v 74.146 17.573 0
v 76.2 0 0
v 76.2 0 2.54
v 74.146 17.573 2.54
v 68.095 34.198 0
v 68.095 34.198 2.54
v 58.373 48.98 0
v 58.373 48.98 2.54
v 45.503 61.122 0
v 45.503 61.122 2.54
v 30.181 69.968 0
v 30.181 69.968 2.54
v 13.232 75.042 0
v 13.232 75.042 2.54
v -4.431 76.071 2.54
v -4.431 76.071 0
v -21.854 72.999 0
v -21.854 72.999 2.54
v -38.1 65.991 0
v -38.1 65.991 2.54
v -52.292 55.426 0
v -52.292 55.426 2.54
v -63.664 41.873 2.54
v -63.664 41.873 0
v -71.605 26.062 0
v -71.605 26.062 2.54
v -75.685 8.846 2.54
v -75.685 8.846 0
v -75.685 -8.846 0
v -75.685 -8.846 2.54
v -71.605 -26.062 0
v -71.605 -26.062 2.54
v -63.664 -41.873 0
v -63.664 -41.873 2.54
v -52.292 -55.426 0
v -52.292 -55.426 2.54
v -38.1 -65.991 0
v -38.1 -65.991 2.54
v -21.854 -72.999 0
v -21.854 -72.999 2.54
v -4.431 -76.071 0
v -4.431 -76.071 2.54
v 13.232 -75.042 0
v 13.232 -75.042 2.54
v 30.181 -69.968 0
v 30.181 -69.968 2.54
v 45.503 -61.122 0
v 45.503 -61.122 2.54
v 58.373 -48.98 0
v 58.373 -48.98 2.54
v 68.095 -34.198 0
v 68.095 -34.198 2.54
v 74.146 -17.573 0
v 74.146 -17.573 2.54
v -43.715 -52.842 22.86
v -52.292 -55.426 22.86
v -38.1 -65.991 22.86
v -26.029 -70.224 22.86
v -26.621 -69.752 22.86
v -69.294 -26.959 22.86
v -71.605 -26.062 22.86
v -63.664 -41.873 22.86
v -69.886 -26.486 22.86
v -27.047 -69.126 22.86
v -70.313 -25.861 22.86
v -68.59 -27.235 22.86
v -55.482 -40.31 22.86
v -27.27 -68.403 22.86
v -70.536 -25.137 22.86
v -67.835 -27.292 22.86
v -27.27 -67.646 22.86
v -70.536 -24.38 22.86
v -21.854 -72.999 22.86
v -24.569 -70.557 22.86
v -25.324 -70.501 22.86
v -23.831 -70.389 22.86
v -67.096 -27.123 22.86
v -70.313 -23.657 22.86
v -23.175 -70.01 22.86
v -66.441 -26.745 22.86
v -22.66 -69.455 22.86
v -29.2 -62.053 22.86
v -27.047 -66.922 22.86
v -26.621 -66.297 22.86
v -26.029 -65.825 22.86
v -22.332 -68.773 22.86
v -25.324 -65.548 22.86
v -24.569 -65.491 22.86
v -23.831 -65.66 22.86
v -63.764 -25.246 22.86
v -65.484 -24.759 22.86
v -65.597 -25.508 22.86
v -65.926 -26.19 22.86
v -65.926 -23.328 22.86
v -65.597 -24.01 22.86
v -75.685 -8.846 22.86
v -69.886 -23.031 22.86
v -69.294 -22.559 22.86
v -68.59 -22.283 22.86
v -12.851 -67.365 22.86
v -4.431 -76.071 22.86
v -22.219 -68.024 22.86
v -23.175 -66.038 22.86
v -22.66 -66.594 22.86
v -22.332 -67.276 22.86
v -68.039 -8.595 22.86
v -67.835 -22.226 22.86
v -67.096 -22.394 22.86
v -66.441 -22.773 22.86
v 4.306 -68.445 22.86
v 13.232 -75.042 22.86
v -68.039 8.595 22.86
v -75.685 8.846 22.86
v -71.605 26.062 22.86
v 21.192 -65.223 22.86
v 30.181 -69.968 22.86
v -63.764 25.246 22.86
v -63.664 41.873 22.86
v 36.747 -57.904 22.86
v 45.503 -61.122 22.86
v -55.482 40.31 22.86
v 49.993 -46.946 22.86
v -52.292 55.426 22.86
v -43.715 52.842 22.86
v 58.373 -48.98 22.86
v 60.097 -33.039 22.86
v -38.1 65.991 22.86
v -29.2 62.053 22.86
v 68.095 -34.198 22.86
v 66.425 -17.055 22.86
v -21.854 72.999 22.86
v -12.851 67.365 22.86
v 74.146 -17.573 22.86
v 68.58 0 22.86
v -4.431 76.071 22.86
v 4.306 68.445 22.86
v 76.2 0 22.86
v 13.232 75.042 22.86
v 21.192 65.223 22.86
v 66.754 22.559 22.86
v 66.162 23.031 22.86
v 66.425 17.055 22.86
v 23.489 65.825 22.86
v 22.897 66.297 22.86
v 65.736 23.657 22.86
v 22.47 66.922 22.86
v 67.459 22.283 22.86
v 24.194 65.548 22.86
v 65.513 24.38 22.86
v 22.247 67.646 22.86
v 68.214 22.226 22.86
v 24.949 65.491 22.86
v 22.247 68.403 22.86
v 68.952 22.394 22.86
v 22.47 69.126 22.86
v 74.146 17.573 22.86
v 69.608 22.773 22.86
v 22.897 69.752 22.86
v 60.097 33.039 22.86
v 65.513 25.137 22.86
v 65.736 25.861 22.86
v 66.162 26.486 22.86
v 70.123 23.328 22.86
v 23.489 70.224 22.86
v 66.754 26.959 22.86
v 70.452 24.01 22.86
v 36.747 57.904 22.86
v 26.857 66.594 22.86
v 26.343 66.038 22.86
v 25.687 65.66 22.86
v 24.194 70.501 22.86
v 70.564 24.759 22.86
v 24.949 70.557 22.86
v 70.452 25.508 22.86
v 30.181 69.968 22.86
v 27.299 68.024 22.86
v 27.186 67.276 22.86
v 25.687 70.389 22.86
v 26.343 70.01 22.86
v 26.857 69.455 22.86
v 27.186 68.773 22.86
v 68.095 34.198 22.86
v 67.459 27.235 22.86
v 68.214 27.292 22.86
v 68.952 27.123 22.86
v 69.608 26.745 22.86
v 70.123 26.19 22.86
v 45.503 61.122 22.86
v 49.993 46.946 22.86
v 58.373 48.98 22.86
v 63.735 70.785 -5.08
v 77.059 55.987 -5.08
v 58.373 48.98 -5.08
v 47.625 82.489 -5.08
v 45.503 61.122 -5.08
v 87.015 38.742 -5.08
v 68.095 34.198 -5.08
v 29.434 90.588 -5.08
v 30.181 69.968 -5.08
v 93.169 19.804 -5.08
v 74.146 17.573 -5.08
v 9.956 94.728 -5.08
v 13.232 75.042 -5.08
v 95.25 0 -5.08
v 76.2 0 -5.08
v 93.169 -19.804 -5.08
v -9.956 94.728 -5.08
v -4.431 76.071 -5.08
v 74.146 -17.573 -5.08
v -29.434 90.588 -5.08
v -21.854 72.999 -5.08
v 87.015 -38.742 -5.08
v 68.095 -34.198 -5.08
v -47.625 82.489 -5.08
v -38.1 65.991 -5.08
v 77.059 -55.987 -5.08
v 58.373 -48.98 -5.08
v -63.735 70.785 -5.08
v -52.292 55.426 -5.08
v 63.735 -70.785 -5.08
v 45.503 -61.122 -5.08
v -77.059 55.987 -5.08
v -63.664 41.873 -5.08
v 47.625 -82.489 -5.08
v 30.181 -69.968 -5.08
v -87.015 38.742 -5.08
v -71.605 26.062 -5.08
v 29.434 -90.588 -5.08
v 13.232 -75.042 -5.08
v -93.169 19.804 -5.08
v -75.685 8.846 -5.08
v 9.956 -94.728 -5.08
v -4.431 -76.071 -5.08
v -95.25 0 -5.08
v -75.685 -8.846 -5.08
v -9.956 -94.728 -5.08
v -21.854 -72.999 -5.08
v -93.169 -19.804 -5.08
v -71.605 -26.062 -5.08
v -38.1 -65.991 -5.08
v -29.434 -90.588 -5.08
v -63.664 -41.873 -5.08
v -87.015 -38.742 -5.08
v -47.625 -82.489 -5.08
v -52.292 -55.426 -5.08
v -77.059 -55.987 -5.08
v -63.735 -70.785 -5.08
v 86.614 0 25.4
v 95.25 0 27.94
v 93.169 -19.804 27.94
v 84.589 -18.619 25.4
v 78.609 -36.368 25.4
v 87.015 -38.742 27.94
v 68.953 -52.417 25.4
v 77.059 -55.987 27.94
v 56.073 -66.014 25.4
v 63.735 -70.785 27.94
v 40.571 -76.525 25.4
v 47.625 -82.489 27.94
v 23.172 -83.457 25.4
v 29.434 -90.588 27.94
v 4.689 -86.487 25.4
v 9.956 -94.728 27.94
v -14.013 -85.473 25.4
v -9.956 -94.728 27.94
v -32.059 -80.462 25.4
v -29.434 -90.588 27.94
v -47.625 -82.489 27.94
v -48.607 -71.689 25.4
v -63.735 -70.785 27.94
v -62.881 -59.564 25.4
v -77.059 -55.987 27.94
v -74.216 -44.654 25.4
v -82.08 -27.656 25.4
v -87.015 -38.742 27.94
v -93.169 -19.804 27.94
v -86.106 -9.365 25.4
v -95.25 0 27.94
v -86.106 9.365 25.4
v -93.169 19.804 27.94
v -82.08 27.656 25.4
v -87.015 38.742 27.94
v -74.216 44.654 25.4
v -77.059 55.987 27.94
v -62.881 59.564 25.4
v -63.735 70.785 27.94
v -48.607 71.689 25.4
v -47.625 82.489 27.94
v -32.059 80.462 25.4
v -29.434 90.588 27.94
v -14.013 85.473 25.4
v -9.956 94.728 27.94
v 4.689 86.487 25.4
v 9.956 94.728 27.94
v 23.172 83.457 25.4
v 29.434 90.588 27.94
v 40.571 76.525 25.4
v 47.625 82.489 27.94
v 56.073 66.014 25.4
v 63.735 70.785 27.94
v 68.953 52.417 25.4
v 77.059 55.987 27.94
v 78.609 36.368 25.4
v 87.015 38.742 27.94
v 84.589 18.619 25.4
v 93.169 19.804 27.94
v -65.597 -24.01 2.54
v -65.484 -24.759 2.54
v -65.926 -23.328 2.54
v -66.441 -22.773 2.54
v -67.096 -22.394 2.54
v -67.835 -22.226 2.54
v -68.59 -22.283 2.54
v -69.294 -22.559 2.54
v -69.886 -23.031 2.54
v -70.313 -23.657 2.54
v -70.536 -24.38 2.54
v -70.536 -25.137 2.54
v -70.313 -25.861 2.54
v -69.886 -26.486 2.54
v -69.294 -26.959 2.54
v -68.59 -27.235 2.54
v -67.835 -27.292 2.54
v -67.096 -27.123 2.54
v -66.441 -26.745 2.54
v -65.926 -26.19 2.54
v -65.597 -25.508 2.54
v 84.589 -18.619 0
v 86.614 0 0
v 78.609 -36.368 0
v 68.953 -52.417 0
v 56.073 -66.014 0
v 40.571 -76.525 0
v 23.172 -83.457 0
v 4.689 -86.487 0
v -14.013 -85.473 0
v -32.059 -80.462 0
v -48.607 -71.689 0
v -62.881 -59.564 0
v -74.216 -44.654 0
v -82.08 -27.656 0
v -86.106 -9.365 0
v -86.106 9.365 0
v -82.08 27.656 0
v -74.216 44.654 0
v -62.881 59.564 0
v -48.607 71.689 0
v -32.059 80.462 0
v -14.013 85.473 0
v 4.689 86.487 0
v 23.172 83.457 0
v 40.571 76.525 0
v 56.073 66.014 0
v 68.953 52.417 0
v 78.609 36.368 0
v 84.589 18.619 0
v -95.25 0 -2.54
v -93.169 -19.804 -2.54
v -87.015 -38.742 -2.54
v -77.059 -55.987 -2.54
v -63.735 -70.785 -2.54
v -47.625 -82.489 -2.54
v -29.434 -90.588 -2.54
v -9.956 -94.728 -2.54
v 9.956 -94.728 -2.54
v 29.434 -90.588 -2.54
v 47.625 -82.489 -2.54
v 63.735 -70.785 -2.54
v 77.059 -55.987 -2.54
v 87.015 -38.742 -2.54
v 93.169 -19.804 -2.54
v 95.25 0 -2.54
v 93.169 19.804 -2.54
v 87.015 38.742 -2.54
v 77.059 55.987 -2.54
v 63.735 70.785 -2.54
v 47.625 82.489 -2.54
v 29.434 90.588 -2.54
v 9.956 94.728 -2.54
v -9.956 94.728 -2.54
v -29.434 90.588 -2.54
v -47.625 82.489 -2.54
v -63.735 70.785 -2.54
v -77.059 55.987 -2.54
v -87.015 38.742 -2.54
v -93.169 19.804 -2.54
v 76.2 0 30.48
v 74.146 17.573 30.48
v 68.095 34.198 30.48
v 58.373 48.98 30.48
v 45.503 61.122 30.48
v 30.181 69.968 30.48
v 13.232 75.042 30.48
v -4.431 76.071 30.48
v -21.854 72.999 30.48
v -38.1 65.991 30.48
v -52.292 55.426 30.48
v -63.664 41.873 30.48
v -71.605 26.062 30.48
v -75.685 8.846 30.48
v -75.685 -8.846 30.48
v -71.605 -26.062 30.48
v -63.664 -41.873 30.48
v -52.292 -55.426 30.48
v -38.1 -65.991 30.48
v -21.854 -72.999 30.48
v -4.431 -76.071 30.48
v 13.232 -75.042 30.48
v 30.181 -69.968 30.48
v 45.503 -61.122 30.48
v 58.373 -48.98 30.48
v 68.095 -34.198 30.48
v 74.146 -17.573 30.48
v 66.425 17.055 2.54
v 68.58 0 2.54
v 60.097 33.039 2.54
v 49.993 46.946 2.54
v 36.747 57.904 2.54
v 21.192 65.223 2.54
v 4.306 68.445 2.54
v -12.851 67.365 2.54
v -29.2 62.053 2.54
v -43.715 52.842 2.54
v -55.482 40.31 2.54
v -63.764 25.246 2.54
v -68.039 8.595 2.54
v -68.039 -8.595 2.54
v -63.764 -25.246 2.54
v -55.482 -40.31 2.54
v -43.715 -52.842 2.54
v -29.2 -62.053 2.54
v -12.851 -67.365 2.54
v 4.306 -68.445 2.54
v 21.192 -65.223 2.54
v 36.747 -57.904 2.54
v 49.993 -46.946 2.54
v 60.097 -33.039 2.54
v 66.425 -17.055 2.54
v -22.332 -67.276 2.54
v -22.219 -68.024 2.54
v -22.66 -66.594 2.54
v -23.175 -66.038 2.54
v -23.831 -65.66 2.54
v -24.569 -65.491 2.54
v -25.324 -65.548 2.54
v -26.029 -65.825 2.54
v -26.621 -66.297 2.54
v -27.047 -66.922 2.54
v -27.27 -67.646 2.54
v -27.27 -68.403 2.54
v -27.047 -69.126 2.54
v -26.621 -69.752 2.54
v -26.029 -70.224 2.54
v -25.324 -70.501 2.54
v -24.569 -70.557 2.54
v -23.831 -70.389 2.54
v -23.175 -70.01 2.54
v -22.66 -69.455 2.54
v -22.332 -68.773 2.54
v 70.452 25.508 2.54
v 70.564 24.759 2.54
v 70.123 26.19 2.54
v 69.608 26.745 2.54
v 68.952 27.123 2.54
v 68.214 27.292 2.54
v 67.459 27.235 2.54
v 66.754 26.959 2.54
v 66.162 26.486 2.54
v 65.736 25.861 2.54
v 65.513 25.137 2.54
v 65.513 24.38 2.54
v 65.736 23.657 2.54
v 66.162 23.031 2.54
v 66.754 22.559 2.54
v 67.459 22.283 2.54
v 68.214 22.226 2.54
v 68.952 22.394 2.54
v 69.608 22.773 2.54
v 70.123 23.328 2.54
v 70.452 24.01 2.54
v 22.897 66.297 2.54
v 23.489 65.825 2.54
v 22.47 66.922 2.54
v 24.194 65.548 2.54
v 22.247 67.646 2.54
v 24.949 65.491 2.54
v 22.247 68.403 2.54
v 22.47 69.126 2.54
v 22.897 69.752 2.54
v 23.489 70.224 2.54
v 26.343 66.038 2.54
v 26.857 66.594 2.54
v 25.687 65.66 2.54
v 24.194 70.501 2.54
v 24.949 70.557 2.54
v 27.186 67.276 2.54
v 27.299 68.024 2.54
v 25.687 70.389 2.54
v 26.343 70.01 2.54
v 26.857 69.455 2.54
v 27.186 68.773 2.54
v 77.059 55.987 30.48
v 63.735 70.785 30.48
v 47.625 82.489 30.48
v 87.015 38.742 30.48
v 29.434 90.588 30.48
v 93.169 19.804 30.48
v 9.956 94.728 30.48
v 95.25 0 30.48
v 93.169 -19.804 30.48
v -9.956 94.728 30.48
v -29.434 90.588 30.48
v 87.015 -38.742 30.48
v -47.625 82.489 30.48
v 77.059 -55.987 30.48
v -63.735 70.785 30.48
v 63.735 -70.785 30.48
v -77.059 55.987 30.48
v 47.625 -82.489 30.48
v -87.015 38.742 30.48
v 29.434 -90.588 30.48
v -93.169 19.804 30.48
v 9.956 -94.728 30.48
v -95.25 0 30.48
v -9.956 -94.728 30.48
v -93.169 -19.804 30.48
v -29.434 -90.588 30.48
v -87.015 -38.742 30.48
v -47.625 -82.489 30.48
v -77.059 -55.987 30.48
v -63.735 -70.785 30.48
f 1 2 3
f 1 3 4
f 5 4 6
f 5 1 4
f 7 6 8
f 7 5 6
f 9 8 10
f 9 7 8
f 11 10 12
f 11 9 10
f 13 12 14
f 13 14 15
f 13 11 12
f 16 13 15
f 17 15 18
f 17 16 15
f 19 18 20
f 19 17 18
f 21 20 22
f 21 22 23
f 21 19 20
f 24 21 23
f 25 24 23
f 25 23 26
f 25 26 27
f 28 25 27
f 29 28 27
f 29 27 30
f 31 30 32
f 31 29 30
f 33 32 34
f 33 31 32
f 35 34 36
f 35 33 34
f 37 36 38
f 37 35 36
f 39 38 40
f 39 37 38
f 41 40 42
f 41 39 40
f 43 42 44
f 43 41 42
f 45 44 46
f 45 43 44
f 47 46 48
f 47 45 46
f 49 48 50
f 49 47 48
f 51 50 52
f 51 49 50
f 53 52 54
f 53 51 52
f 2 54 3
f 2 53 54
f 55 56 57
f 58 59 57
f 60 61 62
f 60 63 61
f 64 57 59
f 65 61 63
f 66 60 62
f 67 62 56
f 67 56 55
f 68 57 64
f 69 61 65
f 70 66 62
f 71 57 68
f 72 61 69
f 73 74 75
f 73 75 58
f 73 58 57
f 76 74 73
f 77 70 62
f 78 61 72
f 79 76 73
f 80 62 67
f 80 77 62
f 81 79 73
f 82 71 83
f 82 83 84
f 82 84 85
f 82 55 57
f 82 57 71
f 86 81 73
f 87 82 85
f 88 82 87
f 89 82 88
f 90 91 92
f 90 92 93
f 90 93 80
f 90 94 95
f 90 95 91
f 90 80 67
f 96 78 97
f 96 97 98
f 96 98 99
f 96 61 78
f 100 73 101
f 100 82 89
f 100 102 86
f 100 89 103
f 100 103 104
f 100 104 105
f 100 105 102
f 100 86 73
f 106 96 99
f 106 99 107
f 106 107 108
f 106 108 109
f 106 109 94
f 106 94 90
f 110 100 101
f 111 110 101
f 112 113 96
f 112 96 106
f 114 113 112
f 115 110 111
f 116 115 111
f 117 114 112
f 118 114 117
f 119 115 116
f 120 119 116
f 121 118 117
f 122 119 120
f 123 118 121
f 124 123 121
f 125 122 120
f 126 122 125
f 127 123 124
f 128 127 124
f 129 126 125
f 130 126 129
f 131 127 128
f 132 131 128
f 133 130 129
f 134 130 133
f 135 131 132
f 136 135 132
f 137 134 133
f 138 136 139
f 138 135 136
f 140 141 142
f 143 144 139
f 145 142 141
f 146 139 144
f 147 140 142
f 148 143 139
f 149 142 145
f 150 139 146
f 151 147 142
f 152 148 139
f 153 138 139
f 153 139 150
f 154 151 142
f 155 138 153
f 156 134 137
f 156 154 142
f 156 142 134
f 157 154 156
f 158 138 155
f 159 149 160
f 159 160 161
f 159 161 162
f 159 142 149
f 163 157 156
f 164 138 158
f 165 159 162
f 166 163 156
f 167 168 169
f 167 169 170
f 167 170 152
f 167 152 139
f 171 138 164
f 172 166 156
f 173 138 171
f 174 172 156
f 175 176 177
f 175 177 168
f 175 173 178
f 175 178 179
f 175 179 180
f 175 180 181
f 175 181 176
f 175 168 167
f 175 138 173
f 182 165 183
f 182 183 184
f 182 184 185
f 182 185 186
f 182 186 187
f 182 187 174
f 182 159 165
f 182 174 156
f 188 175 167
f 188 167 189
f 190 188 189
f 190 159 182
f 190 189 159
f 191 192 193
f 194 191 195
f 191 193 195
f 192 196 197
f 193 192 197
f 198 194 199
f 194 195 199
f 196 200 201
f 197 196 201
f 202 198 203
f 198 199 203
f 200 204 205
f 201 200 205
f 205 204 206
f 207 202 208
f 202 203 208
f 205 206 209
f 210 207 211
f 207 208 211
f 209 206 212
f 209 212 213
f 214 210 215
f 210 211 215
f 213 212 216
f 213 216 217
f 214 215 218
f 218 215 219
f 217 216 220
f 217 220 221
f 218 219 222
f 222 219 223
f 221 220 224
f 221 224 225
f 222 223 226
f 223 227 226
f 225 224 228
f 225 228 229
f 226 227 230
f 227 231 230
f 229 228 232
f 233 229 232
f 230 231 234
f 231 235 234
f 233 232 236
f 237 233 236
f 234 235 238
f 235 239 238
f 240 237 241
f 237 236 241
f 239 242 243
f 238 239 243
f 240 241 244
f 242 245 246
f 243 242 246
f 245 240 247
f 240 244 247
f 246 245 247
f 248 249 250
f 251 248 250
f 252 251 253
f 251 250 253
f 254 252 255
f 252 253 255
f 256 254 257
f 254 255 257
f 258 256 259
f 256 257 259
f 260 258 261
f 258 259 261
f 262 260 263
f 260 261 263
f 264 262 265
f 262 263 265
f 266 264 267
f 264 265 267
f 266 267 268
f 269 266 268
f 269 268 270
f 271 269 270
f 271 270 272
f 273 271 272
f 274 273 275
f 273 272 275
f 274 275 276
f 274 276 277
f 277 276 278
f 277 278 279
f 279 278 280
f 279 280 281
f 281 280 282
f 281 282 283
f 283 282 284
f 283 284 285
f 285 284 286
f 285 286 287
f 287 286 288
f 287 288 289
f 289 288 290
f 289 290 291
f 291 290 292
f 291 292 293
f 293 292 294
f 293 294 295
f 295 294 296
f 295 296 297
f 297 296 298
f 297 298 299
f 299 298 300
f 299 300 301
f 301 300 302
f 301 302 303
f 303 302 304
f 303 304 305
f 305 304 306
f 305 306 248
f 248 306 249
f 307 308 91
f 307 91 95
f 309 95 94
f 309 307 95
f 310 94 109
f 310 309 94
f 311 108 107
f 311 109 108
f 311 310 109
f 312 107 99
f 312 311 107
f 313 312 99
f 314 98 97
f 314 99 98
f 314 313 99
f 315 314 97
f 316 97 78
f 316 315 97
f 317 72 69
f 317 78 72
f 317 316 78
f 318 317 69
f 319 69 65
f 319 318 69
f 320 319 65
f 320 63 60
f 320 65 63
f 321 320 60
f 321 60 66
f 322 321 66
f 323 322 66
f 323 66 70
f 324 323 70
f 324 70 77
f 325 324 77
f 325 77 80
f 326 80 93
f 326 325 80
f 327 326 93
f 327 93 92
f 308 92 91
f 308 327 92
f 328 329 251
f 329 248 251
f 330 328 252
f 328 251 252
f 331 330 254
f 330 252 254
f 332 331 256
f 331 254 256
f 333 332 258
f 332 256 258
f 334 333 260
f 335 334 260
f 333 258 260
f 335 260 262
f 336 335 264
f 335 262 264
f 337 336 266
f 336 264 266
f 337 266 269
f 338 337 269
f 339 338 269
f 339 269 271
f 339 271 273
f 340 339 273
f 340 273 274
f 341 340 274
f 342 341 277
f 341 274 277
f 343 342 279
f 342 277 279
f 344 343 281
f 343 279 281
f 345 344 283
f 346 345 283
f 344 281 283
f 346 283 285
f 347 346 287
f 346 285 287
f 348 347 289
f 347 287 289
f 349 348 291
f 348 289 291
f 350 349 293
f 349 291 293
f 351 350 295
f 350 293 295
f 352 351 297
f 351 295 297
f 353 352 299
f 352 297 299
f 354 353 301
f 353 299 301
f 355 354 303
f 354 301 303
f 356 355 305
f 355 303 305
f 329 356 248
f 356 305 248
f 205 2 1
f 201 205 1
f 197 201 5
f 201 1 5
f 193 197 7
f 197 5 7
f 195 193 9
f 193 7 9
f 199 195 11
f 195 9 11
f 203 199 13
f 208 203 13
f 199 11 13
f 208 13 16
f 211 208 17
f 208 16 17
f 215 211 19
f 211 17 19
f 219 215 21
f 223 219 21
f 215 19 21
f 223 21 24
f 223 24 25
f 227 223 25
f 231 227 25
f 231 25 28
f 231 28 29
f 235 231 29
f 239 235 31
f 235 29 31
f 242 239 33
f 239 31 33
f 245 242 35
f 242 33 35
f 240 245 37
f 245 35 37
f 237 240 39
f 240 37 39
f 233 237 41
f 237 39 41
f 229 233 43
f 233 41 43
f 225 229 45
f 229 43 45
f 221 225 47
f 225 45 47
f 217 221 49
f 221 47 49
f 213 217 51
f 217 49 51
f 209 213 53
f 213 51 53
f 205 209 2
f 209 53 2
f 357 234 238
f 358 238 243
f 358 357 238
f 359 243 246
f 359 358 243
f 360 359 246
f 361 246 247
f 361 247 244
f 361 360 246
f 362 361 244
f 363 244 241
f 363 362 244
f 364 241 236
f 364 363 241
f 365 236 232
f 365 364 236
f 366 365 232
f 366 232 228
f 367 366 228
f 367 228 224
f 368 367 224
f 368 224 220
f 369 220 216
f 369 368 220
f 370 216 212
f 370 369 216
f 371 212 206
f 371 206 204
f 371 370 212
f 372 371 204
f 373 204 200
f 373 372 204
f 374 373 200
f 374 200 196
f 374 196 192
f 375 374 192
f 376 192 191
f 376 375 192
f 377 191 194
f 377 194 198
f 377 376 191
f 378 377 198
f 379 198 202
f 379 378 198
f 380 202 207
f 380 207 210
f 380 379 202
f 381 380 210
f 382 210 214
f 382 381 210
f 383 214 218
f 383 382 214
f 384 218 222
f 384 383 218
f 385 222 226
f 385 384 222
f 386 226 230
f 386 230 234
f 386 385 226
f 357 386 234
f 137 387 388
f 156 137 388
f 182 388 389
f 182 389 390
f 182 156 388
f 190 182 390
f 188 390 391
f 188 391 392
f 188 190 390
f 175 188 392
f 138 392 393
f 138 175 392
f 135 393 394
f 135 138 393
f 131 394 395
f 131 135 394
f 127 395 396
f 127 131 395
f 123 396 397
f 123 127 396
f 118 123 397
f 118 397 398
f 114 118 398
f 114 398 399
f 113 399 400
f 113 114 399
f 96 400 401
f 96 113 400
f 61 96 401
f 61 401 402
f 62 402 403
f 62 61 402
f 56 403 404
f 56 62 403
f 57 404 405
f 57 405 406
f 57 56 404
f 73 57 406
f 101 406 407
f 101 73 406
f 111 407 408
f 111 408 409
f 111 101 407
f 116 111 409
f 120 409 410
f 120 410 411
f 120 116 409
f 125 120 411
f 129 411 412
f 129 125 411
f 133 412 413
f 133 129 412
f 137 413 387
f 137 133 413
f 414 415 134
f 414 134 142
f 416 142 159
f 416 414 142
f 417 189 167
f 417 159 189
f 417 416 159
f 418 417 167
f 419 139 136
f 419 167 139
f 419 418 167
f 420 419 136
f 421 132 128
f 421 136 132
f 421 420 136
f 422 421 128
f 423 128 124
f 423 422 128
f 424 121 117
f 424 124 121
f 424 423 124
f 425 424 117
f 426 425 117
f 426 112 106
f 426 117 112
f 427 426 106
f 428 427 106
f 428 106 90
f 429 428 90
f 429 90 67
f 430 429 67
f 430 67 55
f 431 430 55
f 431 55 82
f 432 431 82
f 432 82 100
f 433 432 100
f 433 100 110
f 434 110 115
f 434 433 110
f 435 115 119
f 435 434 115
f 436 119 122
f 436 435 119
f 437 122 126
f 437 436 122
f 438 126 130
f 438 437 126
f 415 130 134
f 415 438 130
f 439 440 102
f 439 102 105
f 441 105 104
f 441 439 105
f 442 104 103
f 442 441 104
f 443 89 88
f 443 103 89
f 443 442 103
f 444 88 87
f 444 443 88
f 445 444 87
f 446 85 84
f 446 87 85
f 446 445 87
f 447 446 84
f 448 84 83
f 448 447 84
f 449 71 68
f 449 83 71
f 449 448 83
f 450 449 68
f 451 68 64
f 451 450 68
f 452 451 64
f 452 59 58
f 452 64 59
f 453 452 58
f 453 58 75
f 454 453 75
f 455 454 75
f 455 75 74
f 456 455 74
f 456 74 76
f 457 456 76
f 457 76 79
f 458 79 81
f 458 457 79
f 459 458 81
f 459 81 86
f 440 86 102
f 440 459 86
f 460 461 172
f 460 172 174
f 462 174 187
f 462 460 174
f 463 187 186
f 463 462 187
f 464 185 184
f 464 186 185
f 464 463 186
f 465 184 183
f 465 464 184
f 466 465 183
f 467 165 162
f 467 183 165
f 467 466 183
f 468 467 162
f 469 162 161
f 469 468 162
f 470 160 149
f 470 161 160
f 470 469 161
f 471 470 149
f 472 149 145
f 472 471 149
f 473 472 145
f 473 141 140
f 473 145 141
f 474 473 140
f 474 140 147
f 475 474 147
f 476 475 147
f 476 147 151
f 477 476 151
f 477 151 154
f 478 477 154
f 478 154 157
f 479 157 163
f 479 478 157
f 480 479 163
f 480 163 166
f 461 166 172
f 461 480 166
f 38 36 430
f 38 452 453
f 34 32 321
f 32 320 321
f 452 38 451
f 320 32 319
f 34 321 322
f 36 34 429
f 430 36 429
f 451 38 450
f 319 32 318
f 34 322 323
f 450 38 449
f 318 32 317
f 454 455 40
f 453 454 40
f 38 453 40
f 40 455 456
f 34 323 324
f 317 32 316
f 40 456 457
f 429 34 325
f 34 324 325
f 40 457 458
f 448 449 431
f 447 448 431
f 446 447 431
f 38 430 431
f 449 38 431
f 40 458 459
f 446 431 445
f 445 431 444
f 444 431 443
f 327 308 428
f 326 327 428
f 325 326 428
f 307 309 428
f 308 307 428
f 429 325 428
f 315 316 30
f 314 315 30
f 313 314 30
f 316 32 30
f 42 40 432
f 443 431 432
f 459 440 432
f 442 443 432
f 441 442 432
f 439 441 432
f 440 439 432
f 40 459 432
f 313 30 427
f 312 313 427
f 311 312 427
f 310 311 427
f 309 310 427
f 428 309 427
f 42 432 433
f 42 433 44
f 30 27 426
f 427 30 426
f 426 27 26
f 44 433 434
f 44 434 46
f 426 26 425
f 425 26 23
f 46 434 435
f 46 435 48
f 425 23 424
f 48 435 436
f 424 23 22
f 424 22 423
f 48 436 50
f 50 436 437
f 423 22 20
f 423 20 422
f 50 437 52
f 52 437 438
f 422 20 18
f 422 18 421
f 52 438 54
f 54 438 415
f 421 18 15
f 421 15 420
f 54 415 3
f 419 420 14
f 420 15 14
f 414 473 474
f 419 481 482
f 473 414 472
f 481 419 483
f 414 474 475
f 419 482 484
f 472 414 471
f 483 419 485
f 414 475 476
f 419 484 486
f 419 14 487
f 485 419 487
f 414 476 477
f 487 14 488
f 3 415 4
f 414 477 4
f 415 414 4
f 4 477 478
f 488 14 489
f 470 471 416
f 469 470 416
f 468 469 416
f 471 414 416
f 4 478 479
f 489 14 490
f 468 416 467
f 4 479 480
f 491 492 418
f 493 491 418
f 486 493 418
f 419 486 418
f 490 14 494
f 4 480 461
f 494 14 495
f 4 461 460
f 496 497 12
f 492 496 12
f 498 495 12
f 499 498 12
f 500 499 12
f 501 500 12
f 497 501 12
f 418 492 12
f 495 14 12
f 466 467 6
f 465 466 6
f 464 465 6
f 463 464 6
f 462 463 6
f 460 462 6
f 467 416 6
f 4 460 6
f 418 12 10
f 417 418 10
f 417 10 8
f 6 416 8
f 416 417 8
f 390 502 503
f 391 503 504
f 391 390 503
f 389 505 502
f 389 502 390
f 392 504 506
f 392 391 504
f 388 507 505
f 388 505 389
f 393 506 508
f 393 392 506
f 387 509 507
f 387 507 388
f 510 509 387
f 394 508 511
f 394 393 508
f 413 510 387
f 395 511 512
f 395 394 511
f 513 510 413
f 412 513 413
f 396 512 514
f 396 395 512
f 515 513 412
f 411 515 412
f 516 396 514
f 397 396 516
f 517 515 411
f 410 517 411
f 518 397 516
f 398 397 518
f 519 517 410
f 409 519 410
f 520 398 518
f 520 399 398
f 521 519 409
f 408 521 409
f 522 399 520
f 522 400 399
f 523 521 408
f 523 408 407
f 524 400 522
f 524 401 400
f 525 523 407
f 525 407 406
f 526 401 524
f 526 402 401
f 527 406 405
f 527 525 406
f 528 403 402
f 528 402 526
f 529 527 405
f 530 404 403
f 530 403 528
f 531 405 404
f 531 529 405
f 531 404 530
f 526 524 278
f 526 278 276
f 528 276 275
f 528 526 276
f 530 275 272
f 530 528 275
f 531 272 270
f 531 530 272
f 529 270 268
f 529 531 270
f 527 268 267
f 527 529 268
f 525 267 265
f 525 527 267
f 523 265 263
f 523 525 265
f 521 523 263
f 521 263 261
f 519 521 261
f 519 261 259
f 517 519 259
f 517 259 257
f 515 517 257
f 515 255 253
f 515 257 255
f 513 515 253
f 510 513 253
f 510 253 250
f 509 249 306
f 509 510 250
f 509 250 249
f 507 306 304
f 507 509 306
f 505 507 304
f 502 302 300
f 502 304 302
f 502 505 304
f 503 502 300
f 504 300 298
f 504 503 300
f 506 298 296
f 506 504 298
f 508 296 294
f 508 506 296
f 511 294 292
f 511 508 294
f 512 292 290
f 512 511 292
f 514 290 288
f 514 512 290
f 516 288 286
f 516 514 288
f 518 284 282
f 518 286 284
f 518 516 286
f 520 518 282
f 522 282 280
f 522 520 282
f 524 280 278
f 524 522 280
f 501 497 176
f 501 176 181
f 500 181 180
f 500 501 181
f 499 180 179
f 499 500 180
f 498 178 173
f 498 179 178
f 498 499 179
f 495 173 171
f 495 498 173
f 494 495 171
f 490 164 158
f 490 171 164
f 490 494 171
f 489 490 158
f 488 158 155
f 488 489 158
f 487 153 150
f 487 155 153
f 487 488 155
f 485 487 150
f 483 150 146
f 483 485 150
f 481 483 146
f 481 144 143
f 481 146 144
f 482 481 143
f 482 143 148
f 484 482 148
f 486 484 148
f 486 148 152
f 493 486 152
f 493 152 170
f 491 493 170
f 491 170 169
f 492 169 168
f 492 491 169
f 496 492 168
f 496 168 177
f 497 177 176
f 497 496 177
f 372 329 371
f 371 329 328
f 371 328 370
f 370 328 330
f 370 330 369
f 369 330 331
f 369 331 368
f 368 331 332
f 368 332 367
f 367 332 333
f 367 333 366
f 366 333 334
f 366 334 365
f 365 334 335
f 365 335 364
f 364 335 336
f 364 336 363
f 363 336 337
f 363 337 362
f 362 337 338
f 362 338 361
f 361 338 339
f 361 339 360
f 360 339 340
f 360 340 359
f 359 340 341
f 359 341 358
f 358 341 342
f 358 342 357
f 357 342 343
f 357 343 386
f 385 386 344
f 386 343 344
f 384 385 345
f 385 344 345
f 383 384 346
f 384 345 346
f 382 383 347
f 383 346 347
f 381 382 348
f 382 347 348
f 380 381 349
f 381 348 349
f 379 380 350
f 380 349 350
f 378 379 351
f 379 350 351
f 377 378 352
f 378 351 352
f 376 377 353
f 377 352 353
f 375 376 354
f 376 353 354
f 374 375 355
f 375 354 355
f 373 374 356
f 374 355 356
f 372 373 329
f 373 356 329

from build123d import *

# Parameters (mm, degrees)
SKETCH1_R           = 82.55
BOSS_EXTRUDE1_DEPTH = 25.4
SKETCH2_R           = 68.58
CUT_EXTRUDE1_DEPTH  = 25.4
SKETCH3_R           = 76.2
CUT_EXTRUDE2_DEPTH  = 2.54
CUT_EXTRUDE3_START  = -2.54
SKETCH4_R           = 76.2
CUT_EXTRUDE3_DEPTH  = 2.54
CHAMFER5_SIZE       = 0.254
CHAMFER6_SIZE       = 0.254
SKETCH6_R           = 2.54
CUT_EXTRUDE4_DEPTH  = 120.474537036
SKETCH7_R           = 95.25
SKETCH7_R_2         = 76.2
BOSS_EXTRUDE2_DEPTH = 25.4
SKETCH9_R           = 95.25
SKETCH9_R_2         = 76.2
BOSS_EXTRUDE3_DEPTH = 5.08


with BuildPart() as part:
    # Sketch1 → Boss-Extrude1 (new body)
    with BuildSketch(Plane.XY):
        Circle(SKETCH1_R)
    extrude(amount=BOSS_EXTRUDE1_DEPTH)

    # Sketch2 → Cut-Extrude1 (cut)
    with BuildSketch(Plane.XY):
        Circle(SKETCH2_R)
    extrude(amount=CUT_EXTRUDE1_DEPTH, mode=Mode.SUBTRACT)

    # Sketch3 → Cut-Extrude2 (cut)
    with BuildSketch(Plane.XY):
        Circle(SKETCH3_R)
    extrude(amount=CUT_EXTRUDE2_DEPTH, mode=Mode.SUBTRACT)

    # Sketch4 → Cut-Extrude3 (cut)
    with BuildSketch(Plane.XY.offset(25.4).offset(CUT_EXTRUDE3_START)):
        Circle(SKETCH4_R)
    extrude(amount=CUT_EXTRUDE3_DEPTH, mode=Mode.SUBTRACT)

    # Chamfer5
    chamfer5_edges = [part.edges().sort_by_distance(p)[0] for p in [
        (-82.55, 0, 0),
    ]]
    chamfer(chamfer5_edges, length=CHAMFER5_SIZE)

    # Chamfer6
    chamfer6_edges = [part.edges().sort_by_distance(p)[0] for p in [
        (-82.55, 0, 25.4),
    ]]
    chamfer(chamfer6_edges, length=CHAMFER6_SIZE)

    # Sketch6 → Cut-Extrude4 (cut, through all)
    with BuildSketch(Plane.XY):
        with Locations((68.024348819, 24.758838175)):
            Circle(SKETCH6_R)
        with Locations((-68.024348819, -24.758838175)):
            Circle(SKETCH6_R)
        with Locations((24.758838175, 68.024348819)):
            Circle(SKETCH6_R)
        with Locations((-24.758838175, -68.024348819)):
            Circle(SKETCH6_R)
    extrude(amount=CUT_EXTRUDE4_DEPTH, mode=Mode.SUBTRACT)

    # Sketch7 → Boss-Extrude2 (add)
    with BuildSketch(Plane(origin=(0, 0, 0), x_dir=(-1, 0, 0), z_dir=(0, 0, -1))):
        Circle(SKETCH7_R)
        with Locations(Location((0, 0, 0), (0, 0, 180))):
            Circle(SKETCH7_R_2, mode=Mode.SUBTRACT)
    extrude(amount=-BOSS_EXTRUDE2_DEPTH)

    # Sketch9 → Boss-Extrude3 (add)
    with BuildSketch(Plane.XY.offset(25.4)):
        with Locations(Location((0, 0, 0), (0, 0, 180))):
            Circle(SKETCH9_R)
        Circle(SKETCH9_R_2, mode=Mode.SUBTRACT)
    boss_extrude3 = extrude(amount=BOSS_EXTRUDE3_DEPTH)

    # Mirror1: Boss-Extrude3 across plane
    add(boss_extrude3.mirror(Plane(origin=(0, 0, 12.7), x_dir=(1, 0, 0), z_dir=(0, 0, -1))))

    # Sketch10 → Cut-Revolve1 (revolve, cut)
    with BuildSketch(Plane(origin=(0, 0, 0), x_dir=(0, 0, -1), z_dir=(1, 0, 0)), mode=Mode.PRIVATE) as cut_revolve1_sk:
        Polygon((0, 86.614), (-25.4, 86.614), (-27.94, 95.25), (2.54, 95.25), align=None)
    revolve(cut_revolve1_sk.sketch.rotate(Axis((0, 0, 22.86), (0, 0, -1)), 90), axis=Axis((0, 0, 22.86), (0, 0, -1)), mode=Mode.SUBTRACT)


solid = part.part
